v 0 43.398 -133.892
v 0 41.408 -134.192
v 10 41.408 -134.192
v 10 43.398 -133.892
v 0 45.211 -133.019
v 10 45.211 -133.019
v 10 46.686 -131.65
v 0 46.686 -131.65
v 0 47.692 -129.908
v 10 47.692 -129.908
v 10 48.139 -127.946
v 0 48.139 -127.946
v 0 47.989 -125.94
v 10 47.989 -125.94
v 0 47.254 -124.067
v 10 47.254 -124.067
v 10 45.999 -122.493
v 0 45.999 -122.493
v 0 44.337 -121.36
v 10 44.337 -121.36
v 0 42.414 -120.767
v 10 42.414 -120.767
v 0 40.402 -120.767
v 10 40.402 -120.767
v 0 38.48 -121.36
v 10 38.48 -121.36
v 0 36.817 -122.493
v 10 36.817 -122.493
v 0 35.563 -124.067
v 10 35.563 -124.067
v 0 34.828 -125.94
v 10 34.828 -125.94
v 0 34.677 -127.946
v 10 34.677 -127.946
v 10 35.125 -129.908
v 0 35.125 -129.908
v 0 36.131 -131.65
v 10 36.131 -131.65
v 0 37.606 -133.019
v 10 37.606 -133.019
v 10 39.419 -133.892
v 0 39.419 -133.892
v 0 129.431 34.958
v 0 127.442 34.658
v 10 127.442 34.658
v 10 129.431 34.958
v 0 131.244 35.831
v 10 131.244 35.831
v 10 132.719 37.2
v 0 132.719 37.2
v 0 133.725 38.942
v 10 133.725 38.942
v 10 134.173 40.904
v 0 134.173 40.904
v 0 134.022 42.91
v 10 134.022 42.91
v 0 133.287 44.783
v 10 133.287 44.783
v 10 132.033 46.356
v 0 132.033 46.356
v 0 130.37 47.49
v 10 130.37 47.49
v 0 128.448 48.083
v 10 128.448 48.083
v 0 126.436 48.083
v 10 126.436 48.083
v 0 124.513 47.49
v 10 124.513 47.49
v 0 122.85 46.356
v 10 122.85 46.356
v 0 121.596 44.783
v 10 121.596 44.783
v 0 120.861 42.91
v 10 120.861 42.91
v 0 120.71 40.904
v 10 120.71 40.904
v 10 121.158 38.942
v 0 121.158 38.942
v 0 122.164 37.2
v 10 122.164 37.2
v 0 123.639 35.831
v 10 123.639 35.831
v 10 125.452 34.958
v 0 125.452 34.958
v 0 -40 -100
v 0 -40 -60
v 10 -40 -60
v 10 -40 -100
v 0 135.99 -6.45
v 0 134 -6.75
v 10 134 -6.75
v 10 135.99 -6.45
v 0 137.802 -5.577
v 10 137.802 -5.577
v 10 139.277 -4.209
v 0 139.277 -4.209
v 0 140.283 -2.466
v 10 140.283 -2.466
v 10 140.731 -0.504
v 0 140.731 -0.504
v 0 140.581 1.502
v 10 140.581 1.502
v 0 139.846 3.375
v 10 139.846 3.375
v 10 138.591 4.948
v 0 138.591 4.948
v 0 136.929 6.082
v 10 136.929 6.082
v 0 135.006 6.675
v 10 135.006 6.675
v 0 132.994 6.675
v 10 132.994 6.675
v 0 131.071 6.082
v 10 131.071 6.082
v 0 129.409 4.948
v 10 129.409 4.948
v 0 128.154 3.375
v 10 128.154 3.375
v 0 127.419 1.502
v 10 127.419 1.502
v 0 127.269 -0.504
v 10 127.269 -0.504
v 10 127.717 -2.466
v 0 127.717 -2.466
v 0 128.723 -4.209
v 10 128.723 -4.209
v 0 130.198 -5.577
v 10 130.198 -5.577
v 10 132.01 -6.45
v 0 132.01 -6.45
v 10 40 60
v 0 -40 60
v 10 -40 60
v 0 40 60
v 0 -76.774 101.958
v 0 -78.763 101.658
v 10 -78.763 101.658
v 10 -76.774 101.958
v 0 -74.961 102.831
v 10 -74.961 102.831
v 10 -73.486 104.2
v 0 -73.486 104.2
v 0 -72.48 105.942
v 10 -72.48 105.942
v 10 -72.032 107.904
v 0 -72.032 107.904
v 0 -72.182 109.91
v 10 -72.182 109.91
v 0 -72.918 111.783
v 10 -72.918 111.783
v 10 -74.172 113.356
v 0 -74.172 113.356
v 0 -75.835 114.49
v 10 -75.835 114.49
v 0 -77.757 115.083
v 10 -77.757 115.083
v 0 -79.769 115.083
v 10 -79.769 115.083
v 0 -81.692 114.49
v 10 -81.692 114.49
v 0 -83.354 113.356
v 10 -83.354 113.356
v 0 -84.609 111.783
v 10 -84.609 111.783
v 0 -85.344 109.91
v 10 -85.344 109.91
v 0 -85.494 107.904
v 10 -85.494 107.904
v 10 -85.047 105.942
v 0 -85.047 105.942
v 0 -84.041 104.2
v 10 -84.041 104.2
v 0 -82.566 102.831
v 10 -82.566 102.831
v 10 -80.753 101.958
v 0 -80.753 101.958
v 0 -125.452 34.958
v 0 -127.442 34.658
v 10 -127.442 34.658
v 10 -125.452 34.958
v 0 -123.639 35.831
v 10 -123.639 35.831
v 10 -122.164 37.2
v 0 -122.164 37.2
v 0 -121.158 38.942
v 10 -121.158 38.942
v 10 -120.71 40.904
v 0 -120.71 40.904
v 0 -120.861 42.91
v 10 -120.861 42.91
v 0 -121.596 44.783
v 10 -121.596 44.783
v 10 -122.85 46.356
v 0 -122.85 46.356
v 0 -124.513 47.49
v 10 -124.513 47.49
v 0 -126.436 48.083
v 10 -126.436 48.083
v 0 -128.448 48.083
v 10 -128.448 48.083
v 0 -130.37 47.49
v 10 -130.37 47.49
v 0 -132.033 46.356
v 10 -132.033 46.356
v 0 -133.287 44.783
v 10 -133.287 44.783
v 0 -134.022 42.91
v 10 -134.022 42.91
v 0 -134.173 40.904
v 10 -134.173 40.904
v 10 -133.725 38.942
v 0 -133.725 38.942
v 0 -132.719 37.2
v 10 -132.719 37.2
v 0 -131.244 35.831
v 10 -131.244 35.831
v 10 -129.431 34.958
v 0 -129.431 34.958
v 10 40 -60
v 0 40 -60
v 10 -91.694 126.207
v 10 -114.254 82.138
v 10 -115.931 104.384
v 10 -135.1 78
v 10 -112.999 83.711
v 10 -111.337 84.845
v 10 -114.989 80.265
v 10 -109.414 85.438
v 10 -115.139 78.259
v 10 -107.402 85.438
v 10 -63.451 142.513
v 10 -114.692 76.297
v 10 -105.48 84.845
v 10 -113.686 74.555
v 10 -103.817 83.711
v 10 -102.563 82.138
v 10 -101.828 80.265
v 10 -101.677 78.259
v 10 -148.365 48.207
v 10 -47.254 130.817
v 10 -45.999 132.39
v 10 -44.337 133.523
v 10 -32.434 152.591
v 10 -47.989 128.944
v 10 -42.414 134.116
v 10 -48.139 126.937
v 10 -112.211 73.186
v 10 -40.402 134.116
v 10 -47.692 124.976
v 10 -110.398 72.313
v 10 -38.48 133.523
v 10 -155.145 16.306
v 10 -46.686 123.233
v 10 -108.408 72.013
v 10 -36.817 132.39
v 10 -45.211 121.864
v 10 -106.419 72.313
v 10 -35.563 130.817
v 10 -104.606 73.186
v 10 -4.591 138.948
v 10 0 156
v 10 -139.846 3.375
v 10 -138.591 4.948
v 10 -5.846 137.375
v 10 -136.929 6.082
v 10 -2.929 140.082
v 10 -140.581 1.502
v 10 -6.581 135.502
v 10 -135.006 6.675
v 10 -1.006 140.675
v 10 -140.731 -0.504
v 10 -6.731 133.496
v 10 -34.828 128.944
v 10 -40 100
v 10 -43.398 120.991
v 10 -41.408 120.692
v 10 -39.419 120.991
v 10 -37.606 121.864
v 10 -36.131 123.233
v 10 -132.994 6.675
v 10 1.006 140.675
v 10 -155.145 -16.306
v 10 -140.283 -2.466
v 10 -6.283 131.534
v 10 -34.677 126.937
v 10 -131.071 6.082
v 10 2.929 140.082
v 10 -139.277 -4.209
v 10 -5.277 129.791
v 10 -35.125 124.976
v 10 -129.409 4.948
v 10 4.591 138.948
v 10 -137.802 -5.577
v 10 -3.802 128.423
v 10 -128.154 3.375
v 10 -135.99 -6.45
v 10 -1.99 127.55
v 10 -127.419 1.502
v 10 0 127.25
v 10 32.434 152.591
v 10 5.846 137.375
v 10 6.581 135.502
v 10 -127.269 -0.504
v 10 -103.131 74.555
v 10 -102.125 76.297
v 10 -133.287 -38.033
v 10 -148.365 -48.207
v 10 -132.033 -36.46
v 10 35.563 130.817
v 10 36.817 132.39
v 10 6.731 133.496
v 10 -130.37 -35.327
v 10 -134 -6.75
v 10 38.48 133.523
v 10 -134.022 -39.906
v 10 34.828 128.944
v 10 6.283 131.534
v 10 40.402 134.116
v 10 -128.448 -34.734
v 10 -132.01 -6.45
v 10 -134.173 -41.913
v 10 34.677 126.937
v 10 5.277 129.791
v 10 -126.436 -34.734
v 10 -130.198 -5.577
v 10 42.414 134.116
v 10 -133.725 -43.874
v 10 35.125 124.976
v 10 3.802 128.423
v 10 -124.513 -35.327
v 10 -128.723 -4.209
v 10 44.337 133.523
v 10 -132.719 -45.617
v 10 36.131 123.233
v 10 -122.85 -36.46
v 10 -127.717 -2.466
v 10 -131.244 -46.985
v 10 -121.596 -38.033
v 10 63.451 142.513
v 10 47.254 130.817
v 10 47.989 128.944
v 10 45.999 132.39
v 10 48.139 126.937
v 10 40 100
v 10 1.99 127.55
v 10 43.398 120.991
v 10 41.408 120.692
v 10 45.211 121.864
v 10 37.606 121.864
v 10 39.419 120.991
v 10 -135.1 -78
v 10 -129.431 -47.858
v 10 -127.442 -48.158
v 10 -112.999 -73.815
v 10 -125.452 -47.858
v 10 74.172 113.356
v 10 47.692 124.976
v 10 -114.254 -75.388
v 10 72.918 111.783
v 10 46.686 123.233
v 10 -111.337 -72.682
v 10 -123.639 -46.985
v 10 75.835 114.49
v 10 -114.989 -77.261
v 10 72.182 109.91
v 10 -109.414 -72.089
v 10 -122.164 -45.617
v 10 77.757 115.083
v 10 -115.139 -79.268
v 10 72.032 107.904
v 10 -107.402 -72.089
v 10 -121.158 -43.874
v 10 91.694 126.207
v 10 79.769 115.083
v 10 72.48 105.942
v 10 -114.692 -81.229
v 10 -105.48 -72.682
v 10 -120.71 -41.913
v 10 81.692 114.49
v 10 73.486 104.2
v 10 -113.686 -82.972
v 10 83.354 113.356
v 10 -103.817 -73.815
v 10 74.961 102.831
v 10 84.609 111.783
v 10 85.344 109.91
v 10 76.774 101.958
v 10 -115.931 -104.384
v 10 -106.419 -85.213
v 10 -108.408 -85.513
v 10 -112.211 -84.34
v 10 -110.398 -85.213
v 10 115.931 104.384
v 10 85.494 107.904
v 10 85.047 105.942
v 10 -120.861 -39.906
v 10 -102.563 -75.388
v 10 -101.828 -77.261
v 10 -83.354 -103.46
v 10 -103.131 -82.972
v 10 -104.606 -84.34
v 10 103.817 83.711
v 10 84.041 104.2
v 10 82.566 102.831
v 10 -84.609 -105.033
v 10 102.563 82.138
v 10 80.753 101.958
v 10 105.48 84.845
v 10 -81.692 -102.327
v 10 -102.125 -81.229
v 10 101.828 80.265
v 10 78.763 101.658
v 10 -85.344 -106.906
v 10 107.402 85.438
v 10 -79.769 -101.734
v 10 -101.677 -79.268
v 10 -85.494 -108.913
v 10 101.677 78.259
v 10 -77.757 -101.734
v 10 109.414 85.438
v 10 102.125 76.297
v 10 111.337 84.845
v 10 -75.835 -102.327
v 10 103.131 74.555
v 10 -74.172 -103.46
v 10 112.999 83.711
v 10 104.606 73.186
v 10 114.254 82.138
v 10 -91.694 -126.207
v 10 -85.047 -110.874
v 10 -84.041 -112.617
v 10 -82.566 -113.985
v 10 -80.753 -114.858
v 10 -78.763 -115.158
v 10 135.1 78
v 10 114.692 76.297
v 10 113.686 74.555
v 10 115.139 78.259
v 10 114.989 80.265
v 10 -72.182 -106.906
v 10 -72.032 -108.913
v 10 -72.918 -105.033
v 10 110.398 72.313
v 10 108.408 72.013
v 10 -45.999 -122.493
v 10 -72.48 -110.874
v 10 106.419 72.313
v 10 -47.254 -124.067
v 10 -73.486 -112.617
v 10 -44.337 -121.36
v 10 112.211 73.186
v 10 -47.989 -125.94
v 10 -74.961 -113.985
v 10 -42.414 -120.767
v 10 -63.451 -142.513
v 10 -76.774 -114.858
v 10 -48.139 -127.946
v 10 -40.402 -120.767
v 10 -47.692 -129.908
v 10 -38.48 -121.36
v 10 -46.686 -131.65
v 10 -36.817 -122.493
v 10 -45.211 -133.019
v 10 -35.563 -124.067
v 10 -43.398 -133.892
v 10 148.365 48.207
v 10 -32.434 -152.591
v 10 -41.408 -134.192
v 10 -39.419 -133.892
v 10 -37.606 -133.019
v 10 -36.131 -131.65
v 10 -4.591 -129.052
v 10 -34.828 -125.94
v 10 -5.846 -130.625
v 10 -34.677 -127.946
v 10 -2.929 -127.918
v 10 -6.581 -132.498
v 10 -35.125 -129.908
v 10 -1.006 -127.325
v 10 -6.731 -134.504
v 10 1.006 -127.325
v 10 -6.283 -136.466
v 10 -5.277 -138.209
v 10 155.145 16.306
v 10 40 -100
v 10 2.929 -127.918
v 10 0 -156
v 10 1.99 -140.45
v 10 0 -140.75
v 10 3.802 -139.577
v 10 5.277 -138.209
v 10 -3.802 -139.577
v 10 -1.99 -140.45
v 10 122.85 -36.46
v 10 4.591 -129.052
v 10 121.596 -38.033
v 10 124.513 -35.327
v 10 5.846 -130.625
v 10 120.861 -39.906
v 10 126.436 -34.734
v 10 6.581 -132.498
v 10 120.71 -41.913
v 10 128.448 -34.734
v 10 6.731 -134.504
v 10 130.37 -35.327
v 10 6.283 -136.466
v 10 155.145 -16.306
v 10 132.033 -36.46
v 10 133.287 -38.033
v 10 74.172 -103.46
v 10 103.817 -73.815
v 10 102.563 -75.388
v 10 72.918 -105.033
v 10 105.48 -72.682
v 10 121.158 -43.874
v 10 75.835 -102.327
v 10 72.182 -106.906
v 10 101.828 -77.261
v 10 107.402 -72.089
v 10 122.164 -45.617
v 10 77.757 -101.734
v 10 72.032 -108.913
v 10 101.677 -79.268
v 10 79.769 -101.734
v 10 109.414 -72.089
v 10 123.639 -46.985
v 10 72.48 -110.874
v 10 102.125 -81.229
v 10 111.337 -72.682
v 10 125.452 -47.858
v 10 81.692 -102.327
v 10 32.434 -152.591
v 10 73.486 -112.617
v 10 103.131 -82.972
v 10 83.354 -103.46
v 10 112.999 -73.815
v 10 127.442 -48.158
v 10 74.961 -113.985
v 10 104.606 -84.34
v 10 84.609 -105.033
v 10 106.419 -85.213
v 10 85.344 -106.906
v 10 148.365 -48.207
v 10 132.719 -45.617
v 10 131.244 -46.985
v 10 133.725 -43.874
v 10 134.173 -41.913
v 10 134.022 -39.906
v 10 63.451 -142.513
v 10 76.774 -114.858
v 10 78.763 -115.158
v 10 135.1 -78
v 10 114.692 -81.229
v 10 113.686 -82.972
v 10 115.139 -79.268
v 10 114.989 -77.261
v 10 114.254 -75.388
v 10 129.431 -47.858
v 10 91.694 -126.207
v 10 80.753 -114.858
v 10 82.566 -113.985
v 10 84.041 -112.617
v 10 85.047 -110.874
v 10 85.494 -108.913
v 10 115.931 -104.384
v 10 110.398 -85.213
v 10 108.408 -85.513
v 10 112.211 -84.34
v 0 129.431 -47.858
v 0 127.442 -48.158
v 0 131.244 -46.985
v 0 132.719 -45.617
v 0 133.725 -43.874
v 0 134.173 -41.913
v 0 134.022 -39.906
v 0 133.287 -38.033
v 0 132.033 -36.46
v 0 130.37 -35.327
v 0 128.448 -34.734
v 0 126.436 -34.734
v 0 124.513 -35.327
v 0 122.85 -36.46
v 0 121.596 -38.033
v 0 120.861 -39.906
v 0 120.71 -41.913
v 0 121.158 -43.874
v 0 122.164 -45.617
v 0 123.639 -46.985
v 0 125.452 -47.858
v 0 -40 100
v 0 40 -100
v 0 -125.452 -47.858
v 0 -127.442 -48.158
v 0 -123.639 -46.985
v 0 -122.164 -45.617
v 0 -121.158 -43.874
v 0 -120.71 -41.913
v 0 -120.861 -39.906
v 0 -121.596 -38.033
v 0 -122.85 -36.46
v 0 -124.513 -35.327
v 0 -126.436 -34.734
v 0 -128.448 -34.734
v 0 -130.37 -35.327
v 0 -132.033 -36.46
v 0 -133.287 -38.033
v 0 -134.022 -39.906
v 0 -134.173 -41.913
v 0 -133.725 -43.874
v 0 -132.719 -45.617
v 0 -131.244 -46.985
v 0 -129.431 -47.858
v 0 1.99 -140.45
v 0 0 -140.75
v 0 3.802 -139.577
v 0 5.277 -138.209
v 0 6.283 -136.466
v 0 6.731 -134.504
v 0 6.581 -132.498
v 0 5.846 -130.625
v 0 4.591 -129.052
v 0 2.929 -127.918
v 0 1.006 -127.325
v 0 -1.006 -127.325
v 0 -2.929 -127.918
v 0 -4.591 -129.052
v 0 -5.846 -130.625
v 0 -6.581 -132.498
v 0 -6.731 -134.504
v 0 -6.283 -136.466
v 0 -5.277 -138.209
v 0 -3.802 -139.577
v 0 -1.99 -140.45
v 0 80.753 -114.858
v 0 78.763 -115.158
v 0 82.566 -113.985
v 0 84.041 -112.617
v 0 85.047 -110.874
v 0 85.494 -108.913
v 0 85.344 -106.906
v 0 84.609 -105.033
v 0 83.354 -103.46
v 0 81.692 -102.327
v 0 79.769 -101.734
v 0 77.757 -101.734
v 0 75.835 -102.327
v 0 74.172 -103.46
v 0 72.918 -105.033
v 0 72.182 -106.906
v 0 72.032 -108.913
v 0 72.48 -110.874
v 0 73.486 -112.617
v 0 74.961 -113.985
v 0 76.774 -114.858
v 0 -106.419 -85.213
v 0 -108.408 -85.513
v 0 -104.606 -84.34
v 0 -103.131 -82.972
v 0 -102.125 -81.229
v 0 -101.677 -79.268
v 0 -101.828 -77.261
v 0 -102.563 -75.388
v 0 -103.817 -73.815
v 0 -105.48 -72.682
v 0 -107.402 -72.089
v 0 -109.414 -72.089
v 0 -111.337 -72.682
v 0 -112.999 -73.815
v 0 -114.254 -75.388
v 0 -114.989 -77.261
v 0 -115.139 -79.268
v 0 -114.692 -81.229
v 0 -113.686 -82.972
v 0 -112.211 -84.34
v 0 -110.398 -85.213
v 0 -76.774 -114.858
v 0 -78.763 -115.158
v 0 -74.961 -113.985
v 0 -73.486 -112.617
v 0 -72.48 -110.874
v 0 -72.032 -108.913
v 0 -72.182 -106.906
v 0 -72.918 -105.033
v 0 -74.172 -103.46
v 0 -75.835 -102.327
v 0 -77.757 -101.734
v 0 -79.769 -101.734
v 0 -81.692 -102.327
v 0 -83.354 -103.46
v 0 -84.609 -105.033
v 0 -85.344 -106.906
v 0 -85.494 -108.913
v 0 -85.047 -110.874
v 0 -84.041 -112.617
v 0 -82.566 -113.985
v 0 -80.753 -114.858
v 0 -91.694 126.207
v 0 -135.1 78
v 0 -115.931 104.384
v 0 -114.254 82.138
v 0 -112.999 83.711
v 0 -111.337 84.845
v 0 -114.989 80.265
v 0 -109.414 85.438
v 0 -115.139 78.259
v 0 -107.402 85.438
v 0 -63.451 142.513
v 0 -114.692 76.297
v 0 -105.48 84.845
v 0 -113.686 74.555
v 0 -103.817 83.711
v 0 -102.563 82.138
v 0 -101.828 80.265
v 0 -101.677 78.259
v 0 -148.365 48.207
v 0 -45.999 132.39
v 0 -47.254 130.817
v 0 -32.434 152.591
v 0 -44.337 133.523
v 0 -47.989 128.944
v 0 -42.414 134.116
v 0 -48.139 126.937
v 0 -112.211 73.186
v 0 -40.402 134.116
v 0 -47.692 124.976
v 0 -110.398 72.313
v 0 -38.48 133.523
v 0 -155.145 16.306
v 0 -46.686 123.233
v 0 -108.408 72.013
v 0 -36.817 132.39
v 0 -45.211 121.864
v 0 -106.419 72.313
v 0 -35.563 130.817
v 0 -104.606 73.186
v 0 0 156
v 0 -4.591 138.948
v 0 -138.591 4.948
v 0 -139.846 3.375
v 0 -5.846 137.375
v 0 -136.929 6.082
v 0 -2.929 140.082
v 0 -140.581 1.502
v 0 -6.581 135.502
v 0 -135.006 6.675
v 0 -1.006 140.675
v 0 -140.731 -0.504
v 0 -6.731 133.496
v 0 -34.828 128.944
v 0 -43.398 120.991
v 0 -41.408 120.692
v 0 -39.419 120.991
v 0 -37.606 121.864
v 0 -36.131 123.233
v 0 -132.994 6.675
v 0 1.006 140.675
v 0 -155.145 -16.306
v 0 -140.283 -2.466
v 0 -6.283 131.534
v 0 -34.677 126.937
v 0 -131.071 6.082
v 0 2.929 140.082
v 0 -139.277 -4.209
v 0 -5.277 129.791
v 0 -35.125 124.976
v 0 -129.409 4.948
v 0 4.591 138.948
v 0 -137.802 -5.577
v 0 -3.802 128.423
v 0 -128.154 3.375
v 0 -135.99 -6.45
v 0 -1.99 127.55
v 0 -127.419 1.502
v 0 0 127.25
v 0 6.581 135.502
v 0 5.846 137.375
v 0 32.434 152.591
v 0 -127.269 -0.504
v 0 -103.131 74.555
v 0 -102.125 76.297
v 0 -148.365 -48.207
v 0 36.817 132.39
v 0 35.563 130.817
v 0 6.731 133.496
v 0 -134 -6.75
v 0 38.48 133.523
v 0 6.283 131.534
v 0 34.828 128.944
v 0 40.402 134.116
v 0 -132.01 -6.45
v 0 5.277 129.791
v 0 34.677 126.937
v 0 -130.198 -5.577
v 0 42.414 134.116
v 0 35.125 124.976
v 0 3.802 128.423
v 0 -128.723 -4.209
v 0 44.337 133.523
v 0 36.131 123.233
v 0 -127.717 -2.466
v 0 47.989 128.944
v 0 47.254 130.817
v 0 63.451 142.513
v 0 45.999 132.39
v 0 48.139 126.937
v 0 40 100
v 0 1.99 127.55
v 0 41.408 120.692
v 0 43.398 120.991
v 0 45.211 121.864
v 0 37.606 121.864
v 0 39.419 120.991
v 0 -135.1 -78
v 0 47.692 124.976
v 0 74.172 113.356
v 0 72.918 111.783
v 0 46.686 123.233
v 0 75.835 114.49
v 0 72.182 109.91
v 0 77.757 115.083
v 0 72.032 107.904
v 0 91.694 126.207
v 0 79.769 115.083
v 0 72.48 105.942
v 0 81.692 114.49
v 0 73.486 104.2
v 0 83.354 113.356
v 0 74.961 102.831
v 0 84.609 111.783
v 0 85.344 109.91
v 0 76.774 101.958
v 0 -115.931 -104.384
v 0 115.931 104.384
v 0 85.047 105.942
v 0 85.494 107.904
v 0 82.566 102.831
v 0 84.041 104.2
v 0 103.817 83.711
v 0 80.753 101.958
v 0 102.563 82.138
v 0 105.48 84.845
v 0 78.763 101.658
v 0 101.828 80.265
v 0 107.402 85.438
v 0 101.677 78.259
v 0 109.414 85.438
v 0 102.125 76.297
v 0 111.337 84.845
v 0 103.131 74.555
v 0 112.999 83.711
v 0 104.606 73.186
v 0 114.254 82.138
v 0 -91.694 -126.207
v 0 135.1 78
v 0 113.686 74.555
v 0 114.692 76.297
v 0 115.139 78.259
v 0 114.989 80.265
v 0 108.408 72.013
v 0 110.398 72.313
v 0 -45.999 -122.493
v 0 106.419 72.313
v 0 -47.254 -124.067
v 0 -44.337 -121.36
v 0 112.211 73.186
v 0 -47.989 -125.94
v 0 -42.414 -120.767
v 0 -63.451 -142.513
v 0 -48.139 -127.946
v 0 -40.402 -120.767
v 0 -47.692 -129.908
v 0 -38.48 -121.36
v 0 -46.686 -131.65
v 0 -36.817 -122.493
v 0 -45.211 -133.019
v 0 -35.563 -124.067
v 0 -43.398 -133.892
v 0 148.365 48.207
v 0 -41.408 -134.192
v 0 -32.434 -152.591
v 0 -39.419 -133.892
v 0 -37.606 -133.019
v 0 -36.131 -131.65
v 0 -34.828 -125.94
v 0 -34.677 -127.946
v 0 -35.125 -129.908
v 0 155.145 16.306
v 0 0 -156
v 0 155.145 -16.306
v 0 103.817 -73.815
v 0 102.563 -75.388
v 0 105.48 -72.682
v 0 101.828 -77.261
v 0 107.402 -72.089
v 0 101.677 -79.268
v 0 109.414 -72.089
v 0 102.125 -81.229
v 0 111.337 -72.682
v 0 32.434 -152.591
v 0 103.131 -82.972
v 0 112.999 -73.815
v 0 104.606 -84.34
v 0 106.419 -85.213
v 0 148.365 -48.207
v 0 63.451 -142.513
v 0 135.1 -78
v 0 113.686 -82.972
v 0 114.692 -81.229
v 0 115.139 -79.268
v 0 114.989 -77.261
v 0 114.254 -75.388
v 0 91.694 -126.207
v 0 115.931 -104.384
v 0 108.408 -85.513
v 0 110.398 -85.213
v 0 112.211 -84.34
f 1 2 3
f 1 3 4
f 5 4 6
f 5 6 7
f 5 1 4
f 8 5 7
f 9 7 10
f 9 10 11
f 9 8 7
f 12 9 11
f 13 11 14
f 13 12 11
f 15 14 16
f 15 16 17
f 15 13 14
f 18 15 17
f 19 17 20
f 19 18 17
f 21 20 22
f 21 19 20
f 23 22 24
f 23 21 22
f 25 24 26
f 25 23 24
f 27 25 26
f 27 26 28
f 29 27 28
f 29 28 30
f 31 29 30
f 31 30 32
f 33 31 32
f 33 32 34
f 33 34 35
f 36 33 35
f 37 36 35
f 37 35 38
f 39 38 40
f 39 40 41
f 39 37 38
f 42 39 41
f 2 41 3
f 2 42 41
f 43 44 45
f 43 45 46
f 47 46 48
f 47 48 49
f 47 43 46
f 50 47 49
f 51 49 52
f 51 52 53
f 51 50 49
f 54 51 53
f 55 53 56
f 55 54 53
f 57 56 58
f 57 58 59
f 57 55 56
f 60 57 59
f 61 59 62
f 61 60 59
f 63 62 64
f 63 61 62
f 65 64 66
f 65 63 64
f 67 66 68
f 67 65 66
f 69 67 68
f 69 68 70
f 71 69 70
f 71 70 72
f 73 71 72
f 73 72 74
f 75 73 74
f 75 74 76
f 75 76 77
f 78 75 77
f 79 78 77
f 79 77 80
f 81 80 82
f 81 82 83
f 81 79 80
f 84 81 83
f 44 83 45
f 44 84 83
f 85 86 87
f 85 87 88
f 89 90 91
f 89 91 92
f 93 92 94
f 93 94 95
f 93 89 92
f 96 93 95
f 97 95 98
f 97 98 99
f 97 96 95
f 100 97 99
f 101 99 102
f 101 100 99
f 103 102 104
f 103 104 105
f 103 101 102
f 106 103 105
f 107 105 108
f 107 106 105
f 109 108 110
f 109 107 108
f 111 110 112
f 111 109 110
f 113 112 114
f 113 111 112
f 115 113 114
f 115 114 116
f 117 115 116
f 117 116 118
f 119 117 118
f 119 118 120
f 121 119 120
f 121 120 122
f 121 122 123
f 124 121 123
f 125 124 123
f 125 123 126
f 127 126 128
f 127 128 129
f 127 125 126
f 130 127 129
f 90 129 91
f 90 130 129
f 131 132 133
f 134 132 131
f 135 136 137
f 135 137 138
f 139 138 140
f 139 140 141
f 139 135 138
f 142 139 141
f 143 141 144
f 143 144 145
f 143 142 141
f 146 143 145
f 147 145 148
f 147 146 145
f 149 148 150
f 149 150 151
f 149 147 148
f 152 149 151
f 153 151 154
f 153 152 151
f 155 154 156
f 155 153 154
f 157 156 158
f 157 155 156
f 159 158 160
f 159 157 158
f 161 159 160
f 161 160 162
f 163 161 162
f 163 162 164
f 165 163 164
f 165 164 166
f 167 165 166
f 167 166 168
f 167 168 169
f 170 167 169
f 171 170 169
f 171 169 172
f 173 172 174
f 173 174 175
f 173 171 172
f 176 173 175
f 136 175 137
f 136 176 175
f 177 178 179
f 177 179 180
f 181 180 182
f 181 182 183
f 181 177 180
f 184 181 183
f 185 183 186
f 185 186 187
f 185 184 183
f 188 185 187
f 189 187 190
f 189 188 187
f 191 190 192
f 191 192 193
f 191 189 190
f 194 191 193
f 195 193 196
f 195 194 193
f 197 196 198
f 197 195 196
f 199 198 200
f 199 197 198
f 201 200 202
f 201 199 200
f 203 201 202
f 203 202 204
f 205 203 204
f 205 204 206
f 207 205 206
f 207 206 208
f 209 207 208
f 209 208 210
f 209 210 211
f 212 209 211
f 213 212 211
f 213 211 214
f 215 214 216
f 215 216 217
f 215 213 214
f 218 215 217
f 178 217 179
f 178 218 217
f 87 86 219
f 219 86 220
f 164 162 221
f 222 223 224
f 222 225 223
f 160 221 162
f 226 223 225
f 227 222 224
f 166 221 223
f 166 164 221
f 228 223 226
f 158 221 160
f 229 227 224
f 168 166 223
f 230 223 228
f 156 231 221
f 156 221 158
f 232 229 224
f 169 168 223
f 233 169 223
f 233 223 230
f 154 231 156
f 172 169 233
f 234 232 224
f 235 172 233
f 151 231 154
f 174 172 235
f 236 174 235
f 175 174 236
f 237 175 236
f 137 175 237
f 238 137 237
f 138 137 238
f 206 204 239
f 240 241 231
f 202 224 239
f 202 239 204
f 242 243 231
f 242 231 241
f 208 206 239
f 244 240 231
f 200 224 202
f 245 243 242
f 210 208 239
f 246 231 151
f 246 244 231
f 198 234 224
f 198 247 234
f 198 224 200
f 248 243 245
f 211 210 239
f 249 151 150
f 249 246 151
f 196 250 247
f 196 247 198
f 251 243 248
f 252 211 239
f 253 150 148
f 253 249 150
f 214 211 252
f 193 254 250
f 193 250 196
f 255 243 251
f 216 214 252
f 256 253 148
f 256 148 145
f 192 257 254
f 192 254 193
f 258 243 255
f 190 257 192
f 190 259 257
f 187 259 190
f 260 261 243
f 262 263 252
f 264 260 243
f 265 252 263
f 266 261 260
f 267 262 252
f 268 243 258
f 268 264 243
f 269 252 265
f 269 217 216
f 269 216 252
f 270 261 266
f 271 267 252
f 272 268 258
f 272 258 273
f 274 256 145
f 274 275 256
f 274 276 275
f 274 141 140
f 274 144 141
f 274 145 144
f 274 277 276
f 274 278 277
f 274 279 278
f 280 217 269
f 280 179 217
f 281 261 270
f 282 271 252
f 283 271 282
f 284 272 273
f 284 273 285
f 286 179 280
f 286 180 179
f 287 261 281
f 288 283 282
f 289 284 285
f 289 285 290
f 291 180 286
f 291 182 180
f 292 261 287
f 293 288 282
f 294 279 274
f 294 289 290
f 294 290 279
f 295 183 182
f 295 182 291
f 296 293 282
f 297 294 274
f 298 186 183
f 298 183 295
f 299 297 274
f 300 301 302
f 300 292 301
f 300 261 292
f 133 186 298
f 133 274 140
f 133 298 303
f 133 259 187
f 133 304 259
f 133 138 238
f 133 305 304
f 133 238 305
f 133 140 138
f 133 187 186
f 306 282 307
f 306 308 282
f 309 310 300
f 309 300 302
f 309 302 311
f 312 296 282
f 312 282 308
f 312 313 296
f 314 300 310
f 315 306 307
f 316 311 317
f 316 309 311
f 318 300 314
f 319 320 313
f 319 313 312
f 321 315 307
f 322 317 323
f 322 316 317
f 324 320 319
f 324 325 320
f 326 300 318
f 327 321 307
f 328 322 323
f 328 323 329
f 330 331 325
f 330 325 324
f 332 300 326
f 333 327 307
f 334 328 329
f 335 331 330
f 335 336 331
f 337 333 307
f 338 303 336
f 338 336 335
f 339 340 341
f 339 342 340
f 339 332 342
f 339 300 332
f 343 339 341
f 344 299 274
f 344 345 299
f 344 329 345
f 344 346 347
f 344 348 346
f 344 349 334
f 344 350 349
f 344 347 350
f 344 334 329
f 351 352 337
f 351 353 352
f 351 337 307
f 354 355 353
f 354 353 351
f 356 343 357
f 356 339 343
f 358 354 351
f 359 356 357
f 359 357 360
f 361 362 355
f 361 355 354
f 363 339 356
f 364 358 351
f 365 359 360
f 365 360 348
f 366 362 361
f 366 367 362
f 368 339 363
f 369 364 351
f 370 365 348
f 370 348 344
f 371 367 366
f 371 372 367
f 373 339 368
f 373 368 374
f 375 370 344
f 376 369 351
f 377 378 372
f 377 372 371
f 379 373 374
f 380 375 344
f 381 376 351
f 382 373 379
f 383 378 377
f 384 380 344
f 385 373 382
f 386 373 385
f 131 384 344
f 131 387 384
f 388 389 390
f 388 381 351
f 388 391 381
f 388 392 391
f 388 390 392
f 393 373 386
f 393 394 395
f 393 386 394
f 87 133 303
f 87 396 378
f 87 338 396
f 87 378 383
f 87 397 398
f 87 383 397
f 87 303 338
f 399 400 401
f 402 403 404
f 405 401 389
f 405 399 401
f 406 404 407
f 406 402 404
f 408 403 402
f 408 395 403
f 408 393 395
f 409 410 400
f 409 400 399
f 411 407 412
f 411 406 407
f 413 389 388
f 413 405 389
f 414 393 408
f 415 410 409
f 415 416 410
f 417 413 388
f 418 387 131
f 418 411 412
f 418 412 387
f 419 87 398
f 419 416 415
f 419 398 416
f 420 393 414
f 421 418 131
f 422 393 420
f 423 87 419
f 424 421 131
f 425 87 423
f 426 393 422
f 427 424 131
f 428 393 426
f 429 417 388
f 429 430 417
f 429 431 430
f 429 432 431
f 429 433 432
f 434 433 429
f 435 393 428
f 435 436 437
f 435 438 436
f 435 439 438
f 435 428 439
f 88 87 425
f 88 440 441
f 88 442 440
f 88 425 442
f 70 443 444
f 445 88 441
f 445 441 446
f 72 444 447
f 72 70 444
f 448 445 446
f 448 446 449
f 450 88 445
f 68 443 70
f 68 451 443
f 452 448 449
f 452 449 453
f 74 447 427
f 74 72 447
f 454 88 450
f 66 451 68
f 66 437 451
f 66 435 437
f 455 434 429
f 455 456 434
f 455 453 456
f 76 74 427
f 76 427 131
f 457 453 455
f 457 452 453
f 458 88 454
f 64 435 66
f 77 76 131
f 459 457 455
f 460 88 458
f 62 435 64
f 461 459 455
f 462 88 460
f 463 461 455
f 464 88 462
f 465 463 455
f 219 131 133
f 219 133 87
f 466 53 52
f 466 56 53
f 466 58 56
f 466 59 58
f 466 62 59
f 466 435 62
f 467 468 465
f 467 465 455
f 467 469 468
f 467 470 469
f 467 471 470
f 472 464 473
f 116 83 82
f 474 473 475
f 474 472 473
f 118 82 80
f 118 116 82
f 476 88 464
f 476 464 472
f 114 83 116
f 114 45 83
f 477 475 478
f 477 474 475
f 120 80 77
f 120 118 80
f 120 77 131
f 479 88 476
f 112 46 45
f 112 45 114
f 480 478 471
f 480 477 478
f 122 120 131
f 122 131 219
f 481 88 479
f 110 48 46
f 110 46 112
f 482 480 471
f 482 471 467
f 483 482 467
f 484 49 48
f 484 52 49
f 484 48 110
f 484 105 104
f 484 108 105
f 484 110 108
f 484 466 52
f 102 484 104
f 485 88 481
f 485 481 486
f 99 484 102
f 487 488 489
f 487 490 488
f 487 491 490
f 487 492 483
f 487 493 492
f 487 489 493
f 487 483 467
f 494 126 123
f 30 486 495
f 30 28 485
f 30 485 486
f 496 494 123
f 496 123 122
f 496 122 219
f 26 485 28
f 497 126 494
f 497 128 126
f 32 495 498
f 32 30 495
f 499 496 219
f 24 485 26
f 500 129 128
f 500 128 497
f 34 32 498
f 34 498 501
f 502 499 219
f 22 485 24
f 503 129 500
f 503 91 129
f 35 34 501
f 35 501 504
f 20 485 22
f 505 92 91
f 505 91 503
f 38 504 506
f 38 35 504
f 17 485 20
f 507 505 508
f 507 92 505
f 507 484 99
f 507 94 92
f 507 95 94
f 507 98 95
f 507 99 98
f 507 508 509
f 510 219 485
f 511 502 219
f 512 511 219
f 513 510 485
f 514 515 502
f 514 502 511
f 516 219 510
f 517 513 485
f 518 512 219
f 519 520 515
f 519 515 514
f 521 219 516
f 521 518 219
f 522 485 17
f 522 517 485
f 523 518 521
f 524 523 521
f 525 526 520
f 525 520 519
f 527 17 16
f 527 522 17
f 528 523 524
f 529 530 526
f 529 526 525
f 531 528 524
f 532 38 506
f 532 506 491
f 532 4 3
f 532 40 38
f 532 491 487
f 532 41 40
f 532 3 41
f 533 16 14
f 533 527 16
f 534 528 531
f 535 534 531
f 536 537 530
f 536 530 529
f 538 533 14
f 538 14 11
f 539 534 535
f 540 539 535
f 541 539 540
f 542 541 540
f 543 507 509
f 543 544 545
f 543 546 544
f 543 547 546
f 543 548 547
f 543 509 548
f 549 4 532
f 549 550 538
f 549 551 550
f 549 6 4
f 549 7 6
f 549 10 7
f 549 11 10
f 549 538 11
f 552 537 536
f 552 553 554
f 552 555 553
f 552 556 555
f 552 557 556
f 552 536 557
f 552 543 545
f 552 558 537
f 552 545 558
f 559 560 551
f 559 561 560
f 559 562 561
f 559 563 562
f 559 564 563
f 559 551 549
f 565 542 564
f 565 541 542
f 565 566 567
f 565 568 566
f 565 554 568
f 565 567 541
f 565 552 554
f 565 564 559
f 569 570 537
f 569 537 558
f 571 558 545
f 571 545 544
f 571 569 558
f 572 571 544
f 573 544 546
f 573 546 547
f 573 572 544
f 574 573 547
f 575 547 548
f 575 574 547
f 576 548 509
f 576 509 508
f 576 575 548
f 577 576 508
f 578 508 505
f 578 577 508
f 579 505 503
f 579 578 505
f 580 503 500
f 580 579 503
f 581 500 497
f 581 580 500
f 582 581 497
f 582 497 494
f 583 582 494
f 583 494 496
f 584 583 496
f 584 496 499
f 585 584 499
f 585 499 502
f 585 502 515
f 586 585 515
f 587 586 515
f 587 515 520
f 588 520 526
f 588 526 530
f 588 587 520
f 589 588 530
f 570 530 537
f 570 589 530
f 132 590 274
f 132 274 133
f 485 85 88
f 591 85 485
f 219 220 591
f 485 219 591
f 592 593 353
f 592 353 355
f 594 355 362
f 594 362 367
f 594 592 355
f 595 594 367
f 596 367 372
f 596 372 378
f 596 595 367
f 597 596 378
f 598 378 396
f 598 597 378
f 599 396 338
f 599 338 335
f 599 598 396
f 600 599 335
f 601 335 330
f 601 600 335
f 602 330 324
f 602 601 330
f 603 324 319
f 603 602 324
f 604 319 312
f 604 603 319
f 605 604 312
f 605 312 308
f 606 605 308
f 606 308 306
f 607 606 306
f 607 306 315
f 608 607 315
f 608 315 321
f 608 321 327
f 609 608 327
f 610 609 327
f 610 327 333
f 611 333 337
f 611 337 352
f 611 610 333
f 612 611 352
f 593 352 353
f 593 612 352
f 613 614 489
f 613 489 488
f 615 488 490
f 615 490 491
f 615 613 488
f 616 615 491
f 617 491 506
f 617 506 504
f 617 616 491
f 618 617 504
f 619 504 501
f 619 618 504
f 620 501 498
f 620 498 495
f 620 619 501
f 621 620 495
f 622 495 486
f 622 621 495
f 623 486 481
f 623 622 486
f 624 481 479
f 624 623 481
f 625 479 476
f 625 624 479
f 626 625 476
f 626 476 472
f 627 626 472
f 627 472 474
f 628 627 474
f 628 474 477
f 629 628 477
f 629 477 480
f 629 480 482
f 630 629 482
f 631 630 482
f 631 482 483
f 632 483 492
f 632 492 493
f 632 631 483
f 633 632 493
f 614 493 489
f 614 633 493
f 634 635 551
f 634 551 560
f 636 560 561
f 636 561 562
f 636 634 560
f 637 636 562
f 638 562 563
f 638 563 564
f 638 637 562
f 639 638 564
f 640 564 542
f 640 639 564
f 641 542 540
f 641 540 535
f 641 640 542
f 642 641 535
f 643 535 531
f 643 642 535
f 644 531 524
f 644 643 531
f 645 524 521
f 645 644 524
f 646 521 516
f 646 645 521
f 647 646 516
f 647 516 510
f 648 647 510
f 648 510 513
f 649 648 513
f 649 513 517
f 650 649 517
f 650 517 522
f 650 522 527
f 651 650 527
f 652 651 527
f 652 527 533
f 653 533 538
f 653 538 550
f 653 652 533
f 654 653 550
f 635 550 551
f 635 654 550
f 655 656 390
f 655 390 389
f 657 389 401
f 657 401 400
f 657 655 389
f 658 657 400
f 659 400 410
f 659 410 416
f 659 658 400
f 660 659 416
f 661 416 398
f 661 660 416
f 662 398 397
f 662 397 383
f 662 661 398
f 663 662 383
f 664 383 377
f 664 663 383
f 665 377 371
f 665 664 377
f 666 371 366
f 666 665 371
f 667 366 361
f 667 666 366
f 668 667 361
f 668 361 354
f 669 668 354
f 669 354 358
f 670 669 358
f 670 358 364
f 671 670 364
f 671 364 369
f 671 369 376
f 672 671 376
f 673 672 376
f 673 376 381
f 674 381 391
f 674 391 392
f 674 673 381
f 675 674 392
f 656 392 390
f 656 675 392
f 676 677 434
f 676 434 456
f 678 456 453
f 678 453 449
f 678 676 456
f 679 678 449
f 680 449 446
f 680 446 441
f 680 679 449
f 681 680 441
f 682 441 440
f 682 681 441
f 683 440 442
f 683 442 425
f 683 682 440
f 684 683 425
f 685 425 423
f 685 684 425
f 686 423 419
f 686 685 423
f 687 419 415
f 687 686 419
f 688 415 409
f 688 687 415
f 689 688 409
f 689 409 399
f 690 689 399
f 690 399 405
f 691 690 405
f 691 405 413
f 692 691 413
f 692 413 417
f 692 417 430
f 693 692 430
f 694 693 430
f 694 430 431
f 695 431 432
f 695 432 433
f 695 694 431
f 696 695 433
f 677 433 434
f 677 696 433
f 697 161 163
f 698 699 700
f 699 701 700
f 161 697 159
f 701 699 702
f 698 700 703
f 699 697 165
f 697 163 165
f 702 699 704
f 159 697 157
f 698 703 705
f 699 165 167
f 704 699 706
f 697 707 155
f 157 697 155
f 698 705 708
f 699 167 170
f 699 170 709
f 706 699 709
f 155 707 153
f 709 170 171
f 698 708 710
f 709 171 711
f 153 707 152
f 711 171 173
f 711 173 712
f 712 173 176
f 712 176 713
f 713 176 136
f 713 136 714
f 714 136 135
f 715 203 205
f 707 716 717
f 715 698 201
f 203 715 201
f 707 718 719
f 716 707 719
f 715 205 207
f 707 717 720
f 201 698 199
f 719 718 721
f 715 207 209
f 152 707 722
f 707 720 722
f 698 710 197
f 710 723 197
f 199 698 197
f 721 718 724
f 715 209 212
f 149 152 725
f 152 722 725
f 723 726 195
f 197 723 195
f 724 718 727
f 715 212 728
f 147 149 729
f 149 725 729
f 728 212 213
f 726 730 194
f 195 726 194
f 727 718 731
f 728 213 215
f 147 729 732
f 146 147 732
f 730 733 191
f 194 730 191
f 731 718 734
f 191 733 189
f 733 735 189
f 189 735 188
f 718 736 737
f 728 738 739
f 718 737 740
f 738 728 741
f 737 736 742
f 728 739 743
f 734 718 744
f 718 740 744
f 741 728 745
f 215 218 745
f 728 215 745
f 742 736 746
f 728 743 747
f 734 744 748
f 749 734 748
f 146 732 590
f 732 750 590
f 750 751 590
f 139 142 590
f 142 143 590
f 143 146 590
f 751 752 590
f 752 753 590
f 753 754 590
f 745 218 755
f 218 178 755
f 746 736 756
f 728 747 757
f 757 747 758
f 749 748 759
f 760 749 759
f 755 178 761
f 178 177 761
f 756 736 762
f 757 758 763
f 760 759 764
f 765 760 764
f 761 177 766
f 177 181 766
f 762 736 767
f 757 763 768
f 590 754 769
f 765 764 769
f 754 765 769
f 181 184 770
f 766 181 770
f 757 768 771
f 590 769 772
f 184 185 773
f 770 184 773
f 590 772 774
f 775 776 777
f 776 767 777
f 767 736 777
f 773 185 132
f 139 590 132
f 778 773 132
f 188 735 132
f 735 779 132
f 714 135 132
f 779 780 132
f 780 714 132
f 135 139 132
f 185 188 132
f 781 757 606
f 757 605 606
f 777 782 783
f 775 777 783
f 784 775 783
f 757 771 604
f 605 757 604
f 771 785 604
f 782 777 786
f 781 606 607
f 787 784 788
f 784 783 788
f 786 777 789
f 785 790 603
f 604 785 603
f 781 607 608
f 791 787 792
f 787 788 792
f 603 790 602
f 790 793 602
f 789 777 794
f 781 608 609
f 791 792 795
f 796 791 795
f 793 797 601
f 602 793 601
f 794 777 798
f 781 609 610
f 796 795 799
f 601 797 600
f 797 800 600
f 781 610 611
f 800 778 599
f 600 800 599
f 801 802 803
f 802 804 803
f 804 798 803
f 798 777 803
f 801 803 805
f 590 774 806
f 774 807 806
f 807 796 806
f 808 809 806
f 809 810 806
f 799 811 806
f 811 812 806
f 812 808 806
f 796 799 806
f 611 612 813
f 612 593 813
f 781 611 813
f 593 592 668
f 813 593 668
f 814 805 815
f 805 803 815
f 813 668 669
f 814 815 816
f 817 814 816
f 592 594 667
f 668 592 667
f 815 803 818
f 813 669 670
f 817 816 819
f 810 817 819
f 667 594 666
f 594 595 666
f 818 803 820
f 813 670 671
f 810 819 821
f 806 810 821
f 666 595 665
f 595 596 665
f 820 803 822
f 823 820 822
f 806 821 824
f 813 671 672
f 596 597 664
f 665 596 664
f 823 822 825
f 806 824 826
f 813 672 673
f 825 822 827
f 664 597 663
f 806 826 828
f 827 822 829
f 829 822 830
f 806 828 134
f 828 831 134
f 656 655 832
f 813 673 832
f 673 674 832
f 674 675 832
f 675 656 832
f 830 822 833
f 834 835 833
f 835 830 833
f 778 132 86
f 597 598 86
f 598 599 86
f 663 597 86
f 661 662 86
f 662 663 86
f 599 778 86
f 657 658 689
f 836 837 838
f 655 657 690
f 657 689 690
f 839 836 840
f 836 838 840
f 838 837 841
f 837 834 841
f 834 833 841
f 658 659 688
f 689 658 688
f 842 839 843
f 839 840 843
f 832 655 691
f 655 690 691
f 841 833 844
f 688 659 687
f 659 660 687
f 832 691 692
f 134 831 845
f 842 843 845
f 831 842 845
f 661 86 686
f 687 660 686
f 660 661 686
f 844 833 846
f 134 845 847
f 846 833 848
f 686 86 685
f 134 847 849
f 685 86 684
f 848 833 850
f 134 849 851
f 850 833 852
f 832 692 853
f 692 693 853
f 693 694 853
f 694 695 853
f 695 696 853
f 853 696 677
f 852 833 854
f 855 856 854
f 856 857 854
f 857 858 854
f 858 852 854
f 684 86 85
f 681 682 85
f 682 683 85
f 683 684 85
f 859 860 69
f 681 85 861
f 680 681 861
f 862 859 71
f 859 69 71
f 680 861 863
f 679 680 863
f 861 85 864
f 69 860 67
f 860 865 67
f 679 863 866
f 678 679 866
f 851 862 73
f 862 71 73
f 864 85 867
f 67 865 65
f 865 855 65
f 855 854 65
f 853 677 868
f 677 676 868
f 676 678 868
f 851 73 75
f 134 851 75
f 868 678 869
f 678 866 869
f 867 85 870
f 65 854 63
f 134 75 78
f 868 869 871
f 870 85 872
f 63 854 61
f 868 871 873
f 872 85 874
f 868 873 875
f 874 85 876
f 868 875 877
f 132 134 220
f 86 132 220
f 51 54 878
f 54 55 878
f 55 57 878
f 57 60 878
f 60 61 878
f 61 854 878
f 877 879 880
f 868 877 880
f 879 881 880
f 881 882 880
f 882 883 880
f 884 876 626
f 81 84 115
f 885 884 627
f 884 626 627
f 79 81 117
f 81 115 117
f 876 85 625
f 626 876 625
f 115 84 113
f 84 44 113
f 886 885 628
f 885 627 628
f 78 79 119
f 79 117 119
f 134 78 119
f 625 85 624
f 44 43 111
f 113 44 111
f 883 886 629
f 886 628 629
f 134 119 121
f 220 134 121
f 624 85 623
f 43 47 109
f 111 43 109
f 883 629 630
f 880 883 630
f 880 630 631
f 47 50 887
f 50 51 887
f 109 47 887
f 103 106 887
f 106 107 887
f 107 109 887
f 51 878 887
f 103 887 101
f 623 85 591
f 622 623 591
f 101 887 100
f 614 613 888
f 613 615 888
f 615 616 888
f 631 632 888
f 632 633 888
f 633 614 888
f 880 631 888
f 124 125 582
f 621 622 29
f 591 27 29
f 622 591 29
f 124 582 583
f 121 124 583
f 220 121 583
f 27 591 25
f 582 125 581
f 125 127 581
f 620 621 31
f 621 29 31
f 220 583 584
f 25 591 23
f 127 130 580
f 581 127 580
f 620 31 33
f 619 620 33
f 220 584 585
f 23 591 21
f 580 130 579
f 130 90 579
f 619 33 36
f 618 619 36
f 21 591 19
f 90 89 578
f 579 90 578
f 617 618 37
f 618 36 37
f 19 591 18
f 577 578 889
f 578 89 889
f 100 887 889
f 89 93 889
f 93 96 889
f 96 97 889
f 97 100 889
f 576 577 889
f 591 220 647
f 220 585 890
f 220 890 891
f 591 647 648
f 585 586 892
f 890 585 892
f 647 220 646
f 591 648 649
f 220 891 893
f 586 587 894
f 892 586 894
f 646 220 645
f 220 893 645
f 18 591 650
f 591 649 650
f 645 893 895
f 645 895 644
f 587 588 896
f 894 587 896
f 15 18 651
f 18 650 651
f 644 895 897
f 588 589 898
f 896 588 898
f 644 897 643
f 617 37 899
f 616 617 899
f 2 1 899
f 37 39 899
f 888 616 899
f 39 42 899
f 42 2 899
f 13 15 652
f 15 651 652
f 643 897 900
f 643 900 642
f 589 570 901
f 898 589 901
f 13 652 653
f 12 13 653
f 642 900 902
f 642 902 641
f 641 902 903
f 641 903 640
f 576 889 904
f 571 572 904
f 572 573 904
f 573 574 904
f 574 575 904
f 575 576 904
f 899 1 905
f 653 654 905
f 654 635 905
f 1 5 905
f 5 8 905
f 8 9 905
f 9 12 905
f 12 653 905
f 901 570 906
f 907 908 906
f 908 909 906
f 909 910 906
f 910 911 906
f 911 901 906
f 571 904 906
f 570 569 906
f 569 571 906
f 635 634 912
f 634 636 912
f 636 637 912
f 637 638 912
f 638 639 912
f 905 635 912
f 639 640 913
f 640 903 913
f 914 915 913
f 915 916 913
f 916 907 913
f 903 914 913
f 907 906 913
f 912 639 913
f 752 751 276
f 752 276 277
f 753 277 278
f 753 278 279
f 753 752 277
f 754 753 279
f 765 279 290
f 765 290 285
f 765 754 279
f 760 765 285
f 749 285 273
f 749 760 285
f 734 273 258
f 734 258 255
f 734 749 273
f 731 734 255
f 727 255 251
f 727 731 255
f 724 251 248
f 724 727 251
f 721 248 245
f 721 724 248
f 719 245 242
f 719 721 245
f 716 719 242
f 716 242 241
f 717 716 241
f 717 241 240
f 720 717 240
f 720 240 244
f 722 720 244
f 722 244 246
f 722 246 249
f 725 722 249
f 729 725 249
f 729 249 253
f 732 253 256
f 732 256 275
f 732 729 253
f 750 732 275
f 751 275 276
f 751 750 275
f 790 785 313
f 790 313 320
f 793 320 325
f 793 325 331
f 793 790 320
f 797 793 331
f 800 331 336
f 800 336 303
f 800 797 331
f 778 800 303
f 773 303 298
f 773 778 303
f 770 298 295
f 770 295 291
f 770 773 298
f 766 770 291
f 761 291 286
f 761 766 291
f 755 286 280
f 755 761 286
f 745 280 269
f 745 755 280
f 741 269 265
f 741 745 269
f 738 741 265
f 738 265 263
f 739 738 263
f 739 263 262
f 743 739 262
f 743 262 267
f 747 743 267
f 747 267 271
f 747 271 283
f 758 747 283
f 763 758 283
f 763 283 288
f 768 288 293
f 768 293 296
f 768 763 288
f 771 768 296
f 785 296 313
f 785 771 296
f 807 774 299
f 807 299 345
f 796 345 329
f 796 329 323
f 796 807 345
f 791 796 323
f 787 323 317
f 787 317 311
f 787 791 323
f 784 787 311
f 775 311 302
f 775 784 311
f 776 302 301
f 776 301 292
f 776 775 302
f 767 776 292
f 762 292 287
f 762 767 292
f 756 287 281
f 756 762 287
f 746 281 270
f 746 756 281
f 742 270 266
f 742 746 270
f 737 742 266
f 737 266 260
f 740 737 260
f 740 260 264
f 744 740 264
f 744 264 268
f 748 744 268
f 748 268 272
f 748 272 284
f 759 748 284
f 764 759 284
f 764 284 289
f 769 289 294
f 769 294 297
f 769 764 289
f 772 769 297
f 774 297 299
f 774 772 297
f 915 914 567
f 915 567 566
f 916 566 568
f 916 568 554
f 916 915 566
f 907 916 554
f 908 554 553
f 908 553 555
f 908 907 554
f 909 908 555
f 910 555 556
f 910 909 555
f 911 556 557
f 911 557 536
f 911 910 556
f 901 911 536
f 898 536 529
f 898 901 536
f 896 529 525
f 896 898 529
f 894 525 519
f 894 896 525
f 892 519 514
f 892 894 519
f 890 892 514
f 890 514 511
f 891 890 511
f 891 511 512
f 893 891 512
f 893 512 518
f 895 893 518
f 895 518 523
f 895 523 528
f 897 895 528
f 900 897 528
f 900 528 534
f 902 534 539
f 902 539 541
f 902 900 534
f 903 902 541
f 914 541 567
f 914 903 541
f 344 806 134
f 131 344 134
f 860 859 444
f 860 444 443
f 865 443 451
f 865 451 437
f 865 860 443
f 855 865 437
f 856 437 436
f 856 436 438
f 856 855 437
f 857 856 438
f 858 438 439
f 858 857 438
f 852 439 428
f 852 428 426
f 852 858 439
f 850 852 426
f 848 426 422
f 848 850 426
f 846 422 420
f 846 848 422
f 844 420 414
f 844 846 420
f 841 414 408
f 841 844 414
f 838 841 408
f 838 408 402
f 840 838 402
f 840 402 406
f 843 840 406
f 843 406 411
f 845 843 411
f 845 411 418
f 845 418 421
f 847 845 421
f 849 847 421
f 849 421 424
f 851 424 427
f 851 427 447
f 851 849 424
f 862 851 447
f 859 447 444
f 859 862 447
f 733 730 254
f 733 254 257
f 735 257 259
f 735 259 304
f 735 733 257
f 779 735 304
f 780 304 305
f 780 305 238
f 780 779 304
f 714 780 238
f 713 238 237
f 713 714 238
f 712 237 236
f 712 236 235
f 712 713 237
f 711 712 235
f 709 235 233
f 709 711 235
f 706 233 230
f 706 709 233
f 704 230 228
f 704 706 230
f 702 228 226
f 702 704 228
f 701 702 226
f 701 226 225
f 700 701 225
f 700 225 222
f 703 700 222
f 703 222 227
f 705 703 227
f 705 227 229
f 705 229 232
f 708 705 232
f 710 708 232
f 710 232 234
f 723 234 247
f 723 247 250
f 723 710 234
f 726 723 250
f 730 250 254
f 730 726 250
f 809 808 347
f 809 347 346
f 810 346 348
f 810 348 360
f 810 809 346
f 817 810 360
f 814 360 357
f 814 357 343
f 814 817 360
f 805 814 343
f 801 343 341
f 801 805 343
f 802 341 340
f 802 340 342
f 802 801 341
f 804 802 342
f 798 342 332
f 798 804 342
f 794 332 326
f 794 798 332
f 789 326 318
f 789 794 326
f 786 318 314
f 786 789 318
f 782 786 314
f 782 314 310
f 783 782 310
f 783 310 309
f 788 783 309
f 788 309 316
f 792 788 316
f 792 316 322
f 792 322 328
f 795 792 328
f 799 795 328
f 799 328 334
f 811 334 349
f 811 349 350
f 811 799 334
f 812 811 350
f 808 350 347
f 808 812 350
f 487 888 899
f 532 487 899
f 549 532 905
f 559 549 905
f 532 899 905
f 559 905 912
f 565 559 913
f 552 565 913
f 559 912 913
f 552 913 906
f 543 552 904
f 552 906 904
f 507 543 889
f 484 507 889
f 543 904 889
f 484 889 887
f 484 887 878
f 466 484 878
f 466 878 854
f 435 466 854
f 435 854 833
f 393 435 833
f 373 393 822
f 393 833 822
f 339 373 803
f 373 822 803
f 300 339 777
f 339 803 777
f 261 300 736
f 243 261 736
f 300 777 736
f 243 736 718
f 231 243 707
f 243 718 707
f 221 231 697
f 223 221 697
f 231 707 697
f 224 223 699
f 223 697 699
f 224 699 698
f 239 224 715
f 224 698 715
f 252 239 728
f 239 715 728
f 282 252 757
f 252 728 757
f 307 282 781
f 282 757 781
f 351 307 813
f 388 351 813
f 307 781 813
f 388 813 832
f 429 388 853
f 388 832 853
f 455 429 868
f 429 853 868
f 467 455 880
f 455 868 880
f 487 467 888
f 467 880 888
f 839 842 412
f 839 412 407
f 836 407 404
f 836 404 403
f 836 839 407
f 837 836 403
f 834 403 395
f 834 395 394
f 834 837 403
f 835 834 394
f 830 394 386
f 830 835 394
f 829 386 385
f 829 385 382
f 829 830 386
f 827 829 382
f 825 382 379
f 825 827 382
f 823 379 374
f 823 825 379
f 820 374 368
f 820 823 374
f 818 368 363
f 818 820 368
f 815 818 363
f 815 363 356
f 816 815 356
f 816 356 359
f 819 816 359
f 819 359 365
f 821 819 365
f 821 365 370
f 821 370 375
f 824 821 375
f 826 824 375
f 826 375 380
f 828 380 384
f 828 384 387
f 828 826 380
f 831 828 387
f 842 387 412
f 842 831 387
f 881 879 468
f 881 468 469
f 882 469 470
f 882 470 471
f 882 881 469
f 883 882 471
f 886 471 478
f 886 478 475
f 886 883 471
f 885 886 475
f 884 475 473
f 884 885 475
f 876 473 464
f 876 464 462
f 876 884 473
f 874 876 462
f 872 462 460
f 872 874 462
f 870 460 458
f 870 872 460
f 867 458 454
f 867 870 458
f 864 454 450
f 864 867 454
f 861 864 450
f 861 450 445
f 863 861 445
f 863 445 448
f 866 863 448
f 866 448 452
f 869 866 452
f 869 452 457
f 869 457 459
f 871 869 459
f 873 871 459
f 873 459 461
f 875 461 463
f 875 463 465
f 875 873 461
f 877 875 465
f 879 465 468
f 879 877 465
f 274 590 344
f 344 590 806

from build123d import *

# Parameters (mm, degrees)
ESQUISSE1_R        = 156
ESQUISSE1_R_2      = 6.75
ESQUISSE1_W        = 40
ESQUISSE1_H        = 80
BOSS_EXTRU_1_DEPTH = 10


with BuildPart() as part:
    # Esquisse1 → Boss.-Extru.1 (new body)
    with BuildSketch(Plane(origin=(0, 0, 0), x_dir=(0, 0, -1), z_dir=(1, 0, 0))):
        Circle(ESQUISSE1_R)
        with Locations((127.441573184, -41.408277246)):
            Circle(ESQUISSE1_R_2, mode=Mode.SUBTRACT)
        with Locations((134, 0)):
            Circle(ESQUISSE1_R_2, mode=Mode.SUBTRACT)
        with Locations((108.408277246, -78.763223807)):
            Circle(ESQUISSE1_R_2, mode=Mode.SUBTRACT)
        with Locations((78.763223807, -108.408277246)):
            Circle(ESQUISSE1_R_2, mode=Mode.SUBTRACT)
        with Locations((41.408277246, -127.441573184)):
            Circle(ESQUISSE1_R_2, mode=Mode.SUBTRACT)
        with Locations((0, -134)):
            Circle(ESQUISSE1_R_2, mode=Mode.SUBTRACT)
        with Locations((-41.408277246, -127.441573184)):
            Circle(ESQUISSE1_R_2, mode=Mode.SUBTRACT)
        with Locations((-78.763223807, -108.408277246)):
            Circle(ESQUISSE1_R_2, mode=Mode.SUBTRACT)
        with Locations((-108.408277246, -78.763223807)):
            Circle(ESQUISSE1_R_2, mode=Mode.SUBTRACT)
        with Locations((-127.441573184, -41.408277246)):
            Circle(ESQUISSE1_R_2, mode=Mode.SUBTRACT)
        with Locations((-134, 0)):
            Circle(ESQUISSE1_R_2, mode=Mode.SUBTRACT)
        with Locations((-127.441573184, 41.408277246)):
            Circle(ESQUISSE1_R_2, mode=Mode.SUBTRACT)
        with Locations((-108.408277246, 78.763223807)):
            Circle(ESQUISSE1_R_2, mode=Mode.SUBTRACT)
        with Locations((-78.763223807, 108.408277246)):
            Circle(ESQUISSE1_R_2, mode=Mode.SUBTRACT)
        with Locations((-41.408277246, 127.441573184)):
            Circle(ESQUISSE1_R_2, mode=Mode.SUBTRACT)
        with Locations((0, 134)):
            Circle(ESQUISSE1_R_2, mode=Mode.SUBTRACT)
        with Locations((41.408277246, 127.441573184)):
            Circle(ESQUISSE1_R_2, mode=Mode.SUBTRACT)
        with Locations((78.763223807, 108.408277246)):
            Circle(ESQUISSE1_R_2, mode=Mode.SUBTRACT)
        with Locations((108.408277246, 78.763223807)):
            Circle(ESQUISSE1_R_2, mode=Mode.SUBTRACT)
        with Locations((127.441573184, 41.408277246)):
            Circle(ESQUISSE1_R_2, mode=Mode.SUBTRACT)
        with Locations((-80, 0)):
            Rectangle(ESQUISSE1_W, ESQUISSE1_H, mode=Mode.SUBTRACT)
        with Locations((80, 0)):
            Rectangle(ESQUISSE1_W, ESQUISSE1_H, mode=Mode.SUBTRACT)
    extrude(amount=BOSS_EXTRU_1_DEPTH)


solid = part.part
